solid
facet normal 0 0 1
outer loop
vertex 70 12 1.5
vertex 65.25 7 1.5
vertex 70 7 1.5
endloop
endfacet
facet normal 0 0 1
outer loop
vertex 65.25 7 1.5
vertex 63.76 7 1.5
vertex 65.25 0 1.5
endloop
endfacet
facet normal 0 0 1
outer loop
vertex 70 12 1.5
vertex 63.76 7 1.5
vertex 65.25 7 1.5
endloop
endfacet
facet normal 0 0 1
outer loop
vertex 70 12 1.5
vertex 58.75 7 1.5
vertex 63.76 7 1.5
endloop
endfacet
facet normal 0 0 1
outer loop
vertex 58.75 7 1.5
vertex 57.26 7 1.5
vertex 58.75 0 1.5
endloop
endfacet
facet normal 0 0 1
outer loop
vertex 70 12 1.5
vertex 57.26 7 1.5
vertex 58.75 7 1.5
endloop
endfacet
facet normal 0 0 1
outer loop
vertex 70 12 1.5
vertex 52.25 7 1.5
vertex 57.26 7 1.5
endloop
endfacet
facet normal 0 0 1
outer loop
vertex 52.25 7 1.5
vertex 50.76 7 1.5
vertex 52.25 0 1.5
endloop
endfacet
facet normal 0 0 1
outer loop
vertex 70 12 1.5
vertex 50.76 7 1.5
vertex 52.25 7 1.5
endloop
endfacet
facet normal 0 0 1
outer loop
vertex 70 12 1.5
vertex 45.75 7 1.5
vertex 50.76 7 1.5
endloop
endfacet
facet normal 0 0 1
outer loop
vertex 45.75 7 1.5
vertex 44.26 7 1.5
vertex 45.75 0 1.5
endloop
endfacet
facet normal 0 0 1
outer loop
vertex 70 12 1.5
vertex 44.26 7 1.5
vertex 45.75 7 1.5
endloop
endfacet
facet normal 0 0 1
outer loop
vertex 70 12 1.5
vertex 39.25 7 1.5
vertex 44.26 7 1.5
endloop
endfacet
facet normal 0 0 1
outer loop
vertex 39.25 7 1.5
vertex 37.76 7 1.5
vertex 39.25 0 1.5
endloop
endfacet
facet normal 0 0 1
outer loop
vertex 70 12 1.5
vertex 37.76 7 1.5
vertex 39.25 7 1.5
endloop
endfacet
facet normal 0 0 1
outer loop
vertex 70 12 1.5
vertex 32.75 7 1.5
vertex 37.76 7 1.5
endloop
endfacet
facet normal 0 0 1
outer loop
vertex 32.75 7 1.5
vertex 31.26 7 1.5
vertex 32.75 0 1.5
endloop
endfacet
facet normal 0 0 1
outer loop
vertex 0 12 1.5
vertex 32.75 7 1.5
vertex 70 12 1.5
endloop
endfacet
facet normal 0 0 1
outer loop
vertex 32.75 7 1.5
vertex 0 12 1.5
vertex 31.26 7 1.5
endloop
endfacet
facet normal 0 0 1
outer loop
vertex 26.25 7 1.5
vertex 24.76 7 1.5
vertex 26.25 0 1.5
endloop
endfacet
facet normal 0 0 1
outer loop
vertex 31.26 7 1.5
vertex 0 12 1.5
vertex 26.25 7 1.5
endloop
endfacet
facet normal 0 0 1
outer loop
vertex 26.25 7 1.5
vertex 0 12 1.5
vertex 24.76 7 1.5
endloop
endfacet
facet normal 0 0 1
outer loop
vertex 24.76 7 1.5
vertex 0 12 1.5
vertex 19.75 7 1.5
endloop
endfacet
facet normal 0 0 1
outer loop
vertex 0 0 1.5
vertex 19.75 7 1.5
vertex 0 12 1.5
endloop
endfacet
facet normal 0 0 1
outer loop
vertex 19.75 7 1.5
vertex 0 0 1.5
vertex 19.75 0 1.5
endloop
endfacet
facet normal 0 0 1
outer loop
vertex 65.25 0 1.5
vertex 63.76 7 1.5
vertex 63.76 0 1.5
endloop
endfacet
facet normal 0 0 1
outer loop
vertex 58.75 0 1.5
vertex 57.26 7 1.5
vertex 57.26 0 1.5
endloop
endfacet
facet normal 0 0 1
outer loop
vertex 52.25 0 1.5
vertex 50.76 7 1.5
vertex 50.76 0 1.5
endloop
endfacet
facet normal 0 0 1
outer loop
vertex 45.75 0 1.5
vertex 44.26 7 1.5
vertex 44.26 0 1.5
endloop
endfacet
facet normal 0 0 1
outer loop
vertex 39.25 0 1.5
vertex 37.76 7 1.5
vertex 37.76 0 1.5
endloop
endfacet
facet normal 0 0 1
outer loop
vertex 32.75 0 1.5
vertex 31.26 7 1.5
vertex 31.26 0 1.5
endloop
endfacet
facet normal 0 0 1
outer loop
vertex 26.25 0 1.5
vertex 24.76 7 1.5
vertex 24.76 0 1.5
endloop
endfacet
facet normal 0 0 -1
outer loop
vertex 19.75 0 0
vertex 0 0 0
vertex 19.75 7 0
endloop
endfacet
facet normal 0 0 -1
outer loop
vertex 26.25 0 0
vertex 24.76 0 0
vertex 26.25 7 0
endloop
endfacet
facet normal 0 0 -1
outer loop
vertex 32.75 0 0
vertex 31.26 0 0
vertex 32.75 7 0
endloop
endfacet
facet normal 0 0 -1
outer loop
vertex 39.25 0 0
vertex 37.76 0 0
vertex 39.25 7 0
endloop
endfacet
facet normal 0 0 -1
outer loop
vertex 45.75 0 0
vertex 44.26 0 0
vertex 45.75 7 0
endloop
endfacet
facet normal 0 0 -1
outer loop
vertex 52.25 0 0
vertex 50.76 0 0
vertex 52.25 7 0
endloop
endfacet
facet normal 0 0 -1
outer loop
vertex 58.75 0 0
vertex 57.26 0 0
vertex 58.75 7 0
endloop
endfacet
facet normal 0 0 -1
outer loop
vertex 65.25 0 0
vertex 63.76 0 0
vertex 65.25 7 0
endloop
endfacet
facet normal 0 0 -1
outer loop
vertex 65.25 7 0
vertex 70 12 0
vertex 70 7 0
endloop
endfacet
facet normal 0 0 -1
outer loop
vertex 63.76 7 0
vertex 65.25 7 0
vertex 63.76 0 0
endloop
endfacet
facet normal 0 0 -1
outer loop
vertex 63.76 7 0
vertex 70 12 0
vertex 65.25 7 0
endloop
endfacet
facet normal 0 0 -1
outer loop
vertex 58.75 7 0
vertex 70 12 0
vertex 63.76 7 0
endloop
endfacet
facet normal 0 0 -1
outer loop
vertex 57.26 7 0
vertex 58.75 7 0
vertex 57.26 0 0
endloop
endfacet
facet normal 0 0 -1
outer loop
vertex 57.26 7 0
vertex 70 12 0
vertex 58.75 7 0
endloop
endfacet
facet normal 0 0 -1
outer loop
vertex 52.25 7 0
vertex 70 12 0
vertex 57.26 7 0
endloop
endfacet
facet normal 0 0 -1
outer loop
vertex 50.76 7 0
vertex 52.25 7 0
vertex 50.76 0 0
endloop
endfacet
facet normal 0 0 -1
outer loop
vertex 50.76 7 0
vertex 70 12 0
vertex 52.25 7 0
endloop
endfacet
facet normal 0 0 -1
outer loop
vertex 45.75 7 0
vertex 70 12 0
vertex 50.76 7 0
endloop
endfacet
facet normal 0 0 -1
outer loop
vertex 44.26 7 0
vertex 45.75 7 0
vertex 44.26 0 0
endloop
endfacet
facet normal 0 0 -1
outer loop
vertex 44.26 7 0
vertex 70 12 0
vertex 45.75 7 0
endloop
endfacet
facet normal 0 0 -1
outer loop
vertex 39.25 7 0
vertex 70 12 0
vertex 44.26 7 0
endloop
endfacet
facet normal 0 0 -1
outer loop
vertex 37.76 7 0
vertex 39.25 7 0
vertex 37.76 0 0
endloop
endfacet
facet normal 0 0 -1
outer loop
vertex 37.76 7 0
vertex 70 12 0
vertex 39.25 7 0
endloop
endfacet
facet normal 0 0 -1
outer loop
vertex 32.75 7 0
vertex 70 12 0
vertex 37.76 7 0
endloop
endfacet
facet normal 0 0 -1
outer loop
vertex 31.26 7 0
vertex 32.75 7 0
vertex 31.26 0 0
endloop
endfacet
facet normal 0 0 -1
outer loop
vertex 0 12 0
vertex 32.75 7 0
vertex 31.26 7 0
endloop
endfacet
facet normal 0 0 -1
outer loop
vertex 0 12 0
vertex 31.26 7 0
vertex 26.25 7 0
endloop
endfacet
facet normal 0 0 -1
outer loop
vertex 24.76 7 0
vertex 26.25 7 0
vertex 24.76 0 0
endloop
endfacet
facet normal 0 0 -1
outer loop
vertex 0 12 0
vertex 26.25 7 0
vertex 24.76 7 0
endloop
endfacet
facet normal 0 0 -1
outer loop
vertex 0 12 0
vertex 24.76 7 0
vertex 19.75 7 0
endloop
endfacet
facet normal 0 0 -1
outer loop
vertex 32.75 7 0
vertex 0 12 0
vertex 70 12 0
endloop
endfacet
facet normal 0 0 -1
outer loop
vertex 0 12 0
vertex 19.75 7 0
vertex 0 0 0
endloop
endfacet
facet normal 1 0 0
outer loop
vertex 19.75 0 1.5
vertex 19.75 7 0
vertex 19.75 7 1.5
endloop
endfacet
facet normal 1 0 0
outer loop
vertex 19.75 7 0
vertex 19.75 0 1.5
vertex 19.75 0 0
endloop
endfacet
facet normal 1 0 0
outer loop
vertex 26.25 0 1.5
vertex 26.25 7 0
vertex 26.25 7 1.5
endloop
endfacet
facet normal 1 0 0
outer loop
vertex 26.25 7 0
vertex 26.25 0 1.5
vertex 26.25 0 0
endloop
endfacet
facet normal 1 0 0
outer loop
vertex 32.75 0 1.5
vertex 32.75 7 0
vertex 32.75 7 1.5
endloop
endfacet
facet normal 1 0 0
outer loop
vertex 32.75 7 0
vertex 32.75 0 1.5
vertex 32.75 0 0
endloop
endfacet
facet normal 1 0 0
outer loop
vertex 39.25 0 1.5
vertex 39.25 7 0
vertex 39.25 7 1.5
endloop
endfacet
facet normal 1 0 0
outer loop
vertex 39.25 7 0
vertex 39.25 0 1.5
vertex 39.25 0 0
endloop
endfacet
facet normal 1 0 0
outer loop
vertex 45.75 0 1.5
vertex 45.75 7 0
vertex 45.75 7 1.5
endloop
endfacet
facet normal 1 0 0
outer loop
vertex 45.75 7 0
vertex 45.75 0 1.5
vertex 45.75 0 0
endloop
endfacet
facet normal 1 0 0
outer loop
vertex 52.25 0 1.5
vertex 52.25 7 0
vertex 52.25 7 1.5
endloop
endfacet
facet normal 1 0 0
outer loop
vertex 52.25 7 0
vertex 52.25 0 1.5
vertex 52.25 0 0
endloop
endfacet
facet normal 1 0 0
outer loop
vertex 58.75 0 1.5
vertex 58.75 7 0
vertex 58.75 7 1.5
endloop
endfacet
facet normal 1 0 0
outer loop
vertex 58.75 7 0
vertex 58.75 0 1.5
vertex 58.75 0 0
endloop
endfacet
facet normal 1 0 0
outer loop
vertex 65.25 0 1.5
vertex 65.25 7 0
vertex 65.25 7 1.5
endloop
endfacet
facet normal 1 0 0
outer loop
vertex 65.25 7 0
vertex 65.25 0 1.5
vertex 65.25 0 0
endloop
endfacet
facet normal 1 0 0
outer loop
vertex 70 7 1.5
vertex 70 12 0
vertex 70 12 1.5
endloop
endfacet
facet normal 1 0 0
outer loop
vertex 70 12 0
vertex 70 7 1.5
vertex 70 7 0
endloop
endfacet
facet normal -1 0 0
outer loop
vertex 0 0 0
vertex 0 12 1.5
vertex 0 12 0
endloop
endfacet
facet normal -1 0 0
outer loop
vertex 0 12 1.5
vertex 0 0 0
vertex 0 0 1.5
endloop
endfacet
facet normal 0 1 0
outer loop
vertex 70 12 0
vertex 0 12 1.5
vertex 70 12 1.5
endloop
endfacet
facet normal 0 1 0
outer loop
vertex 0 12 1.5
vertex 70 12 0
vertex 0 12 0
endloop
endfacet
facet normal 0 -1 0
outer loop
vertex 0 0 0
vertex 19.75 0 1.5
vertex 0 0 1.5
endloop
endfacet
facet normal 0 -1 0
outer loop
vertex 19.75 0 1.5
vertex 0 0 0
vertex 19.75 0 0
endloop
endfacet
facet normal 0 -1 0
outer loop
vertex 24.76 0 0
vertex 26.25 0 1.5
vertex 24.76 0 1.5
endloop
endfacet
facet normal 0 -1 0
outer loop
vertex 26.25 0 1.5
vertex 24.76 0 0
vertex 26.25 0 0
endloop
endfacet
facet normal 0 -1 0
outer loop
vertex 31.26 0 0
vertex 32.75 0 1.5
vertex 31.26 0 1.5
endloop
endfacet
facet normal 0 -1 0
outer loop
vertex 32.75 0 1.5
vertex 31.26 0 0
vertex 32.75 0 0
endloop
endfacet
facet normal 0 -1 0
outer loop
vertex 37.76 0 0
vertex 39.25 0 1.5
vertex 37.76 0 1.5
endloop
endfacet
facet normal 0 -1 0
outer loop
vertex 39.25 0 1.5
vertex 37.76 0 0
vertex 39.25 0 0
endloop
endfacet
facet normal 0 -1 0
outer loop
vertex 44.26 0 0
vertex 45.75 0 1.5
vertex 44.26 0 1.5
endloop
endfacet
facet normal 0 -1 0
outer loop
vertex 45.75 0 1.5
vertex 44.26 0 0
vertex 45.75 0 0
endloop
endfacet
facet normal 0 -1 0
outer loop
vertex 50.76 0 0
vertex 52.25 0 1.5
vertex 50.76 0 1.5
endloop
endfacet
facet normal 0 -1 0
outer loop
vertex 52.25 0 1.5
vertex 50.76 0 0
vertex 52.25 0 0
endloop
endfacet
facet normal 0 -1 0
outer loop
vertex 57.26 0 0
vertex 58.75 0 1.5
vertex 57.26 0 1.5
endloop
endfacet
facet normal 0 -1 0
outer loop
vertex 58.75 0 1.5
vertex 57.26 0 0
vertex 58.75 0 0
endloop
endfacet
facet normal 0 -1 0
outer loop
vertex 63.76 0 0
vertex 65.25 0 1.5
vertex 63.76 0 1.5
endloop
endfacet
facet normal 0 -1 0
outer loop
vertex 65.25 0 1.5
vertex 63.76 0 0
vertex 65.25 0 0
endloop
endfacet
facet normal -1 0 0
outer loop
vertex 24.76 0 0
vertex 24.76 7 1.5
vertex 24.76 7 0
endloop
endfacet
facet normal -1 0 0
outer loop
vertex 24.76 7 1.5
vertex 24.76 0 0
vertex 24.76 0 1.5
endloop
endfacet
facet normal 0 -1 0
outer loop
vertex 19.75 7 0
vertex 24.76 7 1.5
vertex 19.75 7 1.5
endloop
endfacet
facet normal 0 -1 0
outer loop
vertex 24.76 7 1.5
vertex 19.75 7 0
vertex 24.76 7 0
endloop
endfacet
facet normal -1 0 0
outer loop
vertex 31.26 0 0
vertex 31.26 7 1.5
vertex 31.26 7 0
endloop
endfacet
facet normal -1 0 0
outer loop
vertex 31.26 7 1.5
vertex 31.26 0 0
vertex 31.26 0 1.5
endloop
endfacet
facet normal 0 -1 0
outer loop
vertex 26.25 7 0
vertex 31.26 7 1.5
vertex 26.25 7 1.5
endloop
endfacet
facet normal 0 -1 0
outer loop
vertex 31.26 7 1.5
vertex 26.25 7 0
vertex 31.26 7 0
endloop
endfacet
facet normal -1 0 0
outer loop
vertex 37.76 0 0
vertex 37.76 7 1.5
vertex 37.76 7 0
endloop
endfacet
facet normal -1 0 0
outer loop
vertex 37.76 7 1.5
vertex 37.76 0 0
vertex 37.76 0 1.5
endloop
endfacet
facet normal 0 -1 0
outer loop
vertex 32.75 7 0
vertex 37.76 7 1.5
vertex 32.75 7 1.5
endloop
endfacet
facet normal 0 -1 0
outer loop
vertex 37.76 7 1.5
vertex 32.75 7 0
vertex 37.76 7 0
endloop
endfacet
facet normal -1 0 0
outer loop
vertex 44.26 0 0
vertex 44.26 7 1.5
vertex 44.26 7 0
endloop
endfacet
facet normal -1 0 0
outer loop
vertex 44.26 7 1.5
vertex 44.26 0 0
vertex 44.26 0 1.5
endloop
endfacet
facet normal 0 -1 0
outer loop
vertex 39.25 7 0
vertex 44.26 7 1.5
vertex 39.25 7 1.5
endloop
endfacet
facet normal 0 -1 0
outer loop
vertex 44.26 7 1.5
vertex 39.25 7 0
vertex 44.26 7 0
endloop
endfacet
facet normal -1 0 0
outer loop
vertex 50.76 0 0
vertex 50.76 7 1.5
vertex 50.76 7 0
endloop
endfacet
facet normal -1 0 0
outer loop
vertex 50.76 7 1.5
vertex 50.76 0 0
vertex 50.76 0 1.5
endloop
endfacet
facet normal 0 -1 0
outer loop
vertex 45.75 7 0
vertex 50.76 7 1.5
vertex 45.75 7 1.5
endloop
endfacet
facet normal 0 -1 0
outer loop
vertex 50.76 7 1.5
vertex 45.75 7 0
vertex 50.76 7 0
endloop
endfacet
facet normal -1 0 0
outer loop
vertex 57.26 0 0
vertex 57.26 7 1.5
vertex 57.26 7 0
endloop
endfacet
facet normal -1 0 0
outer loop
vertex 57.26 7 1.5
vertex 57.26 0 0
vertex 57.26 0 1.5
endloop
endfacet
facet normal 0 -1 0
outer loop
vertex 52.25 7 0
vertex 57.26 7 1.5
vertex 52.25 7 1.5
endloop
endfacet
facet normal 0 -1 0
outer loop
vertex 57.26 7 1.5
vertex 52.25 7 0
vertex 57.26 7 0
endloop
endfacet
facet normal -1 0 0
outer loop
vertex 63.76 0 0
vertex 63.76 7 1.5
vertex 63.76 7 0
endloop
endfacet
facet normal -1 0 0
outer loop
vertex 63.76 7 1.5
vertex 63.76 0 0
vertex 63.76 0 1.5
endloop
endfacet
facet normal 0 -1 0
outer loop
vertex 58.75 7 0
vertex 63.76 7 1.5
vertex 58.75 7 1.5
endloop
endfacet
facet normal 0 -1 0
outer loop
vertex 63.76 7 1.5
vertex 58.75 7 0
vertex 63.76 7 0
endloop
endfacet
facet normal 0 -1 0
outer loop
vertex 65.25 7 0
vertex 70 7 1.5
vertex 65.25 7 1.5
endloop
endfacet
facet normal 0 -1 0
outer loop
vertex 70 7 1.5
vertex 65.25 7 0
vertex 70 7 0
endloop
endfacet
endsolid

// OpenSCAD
// Agarose gel comb - a flat plate with a back bar and a row of rectangular teeth, for casting
// horizontal gels. NOVEL general part.
//

cols   = 10;
teeth_d = 5.0;
teeth_l = 12;
pitch  = 1.5;
base_t = 1.5;
back_w = 12;

$fn = 48;

P = max(pitch, teeth_d + 1.5);                 // keep a material wall between teeth
L = 70;                                        // spine length (X)
w = back_w + 2 * teeth_l + (cols - 1) * P;    // total width (Y)

difference() {
    union() {
        cube([L, back_w, base_t]);                 // spine (back bar)
        for (i = [0 : cols - 1])
            translate([L / 2 - (teeth_l + P / 2) + i * P, -(teeth_l / 2), 0])
                cube([teeth_d, teeth_l, base_t]);   // teeth, hanging in -Y
    }
    for (i = [0 : cols - 1])
        translate([L / 2 - (teeth_l + P / 2) + i * P, -(teeth_l / 2 + 1), 0])
            cube([teeth_d + 0.01, teeth_l + 2, base_t + 1]);   // pocket in each tooth
}
